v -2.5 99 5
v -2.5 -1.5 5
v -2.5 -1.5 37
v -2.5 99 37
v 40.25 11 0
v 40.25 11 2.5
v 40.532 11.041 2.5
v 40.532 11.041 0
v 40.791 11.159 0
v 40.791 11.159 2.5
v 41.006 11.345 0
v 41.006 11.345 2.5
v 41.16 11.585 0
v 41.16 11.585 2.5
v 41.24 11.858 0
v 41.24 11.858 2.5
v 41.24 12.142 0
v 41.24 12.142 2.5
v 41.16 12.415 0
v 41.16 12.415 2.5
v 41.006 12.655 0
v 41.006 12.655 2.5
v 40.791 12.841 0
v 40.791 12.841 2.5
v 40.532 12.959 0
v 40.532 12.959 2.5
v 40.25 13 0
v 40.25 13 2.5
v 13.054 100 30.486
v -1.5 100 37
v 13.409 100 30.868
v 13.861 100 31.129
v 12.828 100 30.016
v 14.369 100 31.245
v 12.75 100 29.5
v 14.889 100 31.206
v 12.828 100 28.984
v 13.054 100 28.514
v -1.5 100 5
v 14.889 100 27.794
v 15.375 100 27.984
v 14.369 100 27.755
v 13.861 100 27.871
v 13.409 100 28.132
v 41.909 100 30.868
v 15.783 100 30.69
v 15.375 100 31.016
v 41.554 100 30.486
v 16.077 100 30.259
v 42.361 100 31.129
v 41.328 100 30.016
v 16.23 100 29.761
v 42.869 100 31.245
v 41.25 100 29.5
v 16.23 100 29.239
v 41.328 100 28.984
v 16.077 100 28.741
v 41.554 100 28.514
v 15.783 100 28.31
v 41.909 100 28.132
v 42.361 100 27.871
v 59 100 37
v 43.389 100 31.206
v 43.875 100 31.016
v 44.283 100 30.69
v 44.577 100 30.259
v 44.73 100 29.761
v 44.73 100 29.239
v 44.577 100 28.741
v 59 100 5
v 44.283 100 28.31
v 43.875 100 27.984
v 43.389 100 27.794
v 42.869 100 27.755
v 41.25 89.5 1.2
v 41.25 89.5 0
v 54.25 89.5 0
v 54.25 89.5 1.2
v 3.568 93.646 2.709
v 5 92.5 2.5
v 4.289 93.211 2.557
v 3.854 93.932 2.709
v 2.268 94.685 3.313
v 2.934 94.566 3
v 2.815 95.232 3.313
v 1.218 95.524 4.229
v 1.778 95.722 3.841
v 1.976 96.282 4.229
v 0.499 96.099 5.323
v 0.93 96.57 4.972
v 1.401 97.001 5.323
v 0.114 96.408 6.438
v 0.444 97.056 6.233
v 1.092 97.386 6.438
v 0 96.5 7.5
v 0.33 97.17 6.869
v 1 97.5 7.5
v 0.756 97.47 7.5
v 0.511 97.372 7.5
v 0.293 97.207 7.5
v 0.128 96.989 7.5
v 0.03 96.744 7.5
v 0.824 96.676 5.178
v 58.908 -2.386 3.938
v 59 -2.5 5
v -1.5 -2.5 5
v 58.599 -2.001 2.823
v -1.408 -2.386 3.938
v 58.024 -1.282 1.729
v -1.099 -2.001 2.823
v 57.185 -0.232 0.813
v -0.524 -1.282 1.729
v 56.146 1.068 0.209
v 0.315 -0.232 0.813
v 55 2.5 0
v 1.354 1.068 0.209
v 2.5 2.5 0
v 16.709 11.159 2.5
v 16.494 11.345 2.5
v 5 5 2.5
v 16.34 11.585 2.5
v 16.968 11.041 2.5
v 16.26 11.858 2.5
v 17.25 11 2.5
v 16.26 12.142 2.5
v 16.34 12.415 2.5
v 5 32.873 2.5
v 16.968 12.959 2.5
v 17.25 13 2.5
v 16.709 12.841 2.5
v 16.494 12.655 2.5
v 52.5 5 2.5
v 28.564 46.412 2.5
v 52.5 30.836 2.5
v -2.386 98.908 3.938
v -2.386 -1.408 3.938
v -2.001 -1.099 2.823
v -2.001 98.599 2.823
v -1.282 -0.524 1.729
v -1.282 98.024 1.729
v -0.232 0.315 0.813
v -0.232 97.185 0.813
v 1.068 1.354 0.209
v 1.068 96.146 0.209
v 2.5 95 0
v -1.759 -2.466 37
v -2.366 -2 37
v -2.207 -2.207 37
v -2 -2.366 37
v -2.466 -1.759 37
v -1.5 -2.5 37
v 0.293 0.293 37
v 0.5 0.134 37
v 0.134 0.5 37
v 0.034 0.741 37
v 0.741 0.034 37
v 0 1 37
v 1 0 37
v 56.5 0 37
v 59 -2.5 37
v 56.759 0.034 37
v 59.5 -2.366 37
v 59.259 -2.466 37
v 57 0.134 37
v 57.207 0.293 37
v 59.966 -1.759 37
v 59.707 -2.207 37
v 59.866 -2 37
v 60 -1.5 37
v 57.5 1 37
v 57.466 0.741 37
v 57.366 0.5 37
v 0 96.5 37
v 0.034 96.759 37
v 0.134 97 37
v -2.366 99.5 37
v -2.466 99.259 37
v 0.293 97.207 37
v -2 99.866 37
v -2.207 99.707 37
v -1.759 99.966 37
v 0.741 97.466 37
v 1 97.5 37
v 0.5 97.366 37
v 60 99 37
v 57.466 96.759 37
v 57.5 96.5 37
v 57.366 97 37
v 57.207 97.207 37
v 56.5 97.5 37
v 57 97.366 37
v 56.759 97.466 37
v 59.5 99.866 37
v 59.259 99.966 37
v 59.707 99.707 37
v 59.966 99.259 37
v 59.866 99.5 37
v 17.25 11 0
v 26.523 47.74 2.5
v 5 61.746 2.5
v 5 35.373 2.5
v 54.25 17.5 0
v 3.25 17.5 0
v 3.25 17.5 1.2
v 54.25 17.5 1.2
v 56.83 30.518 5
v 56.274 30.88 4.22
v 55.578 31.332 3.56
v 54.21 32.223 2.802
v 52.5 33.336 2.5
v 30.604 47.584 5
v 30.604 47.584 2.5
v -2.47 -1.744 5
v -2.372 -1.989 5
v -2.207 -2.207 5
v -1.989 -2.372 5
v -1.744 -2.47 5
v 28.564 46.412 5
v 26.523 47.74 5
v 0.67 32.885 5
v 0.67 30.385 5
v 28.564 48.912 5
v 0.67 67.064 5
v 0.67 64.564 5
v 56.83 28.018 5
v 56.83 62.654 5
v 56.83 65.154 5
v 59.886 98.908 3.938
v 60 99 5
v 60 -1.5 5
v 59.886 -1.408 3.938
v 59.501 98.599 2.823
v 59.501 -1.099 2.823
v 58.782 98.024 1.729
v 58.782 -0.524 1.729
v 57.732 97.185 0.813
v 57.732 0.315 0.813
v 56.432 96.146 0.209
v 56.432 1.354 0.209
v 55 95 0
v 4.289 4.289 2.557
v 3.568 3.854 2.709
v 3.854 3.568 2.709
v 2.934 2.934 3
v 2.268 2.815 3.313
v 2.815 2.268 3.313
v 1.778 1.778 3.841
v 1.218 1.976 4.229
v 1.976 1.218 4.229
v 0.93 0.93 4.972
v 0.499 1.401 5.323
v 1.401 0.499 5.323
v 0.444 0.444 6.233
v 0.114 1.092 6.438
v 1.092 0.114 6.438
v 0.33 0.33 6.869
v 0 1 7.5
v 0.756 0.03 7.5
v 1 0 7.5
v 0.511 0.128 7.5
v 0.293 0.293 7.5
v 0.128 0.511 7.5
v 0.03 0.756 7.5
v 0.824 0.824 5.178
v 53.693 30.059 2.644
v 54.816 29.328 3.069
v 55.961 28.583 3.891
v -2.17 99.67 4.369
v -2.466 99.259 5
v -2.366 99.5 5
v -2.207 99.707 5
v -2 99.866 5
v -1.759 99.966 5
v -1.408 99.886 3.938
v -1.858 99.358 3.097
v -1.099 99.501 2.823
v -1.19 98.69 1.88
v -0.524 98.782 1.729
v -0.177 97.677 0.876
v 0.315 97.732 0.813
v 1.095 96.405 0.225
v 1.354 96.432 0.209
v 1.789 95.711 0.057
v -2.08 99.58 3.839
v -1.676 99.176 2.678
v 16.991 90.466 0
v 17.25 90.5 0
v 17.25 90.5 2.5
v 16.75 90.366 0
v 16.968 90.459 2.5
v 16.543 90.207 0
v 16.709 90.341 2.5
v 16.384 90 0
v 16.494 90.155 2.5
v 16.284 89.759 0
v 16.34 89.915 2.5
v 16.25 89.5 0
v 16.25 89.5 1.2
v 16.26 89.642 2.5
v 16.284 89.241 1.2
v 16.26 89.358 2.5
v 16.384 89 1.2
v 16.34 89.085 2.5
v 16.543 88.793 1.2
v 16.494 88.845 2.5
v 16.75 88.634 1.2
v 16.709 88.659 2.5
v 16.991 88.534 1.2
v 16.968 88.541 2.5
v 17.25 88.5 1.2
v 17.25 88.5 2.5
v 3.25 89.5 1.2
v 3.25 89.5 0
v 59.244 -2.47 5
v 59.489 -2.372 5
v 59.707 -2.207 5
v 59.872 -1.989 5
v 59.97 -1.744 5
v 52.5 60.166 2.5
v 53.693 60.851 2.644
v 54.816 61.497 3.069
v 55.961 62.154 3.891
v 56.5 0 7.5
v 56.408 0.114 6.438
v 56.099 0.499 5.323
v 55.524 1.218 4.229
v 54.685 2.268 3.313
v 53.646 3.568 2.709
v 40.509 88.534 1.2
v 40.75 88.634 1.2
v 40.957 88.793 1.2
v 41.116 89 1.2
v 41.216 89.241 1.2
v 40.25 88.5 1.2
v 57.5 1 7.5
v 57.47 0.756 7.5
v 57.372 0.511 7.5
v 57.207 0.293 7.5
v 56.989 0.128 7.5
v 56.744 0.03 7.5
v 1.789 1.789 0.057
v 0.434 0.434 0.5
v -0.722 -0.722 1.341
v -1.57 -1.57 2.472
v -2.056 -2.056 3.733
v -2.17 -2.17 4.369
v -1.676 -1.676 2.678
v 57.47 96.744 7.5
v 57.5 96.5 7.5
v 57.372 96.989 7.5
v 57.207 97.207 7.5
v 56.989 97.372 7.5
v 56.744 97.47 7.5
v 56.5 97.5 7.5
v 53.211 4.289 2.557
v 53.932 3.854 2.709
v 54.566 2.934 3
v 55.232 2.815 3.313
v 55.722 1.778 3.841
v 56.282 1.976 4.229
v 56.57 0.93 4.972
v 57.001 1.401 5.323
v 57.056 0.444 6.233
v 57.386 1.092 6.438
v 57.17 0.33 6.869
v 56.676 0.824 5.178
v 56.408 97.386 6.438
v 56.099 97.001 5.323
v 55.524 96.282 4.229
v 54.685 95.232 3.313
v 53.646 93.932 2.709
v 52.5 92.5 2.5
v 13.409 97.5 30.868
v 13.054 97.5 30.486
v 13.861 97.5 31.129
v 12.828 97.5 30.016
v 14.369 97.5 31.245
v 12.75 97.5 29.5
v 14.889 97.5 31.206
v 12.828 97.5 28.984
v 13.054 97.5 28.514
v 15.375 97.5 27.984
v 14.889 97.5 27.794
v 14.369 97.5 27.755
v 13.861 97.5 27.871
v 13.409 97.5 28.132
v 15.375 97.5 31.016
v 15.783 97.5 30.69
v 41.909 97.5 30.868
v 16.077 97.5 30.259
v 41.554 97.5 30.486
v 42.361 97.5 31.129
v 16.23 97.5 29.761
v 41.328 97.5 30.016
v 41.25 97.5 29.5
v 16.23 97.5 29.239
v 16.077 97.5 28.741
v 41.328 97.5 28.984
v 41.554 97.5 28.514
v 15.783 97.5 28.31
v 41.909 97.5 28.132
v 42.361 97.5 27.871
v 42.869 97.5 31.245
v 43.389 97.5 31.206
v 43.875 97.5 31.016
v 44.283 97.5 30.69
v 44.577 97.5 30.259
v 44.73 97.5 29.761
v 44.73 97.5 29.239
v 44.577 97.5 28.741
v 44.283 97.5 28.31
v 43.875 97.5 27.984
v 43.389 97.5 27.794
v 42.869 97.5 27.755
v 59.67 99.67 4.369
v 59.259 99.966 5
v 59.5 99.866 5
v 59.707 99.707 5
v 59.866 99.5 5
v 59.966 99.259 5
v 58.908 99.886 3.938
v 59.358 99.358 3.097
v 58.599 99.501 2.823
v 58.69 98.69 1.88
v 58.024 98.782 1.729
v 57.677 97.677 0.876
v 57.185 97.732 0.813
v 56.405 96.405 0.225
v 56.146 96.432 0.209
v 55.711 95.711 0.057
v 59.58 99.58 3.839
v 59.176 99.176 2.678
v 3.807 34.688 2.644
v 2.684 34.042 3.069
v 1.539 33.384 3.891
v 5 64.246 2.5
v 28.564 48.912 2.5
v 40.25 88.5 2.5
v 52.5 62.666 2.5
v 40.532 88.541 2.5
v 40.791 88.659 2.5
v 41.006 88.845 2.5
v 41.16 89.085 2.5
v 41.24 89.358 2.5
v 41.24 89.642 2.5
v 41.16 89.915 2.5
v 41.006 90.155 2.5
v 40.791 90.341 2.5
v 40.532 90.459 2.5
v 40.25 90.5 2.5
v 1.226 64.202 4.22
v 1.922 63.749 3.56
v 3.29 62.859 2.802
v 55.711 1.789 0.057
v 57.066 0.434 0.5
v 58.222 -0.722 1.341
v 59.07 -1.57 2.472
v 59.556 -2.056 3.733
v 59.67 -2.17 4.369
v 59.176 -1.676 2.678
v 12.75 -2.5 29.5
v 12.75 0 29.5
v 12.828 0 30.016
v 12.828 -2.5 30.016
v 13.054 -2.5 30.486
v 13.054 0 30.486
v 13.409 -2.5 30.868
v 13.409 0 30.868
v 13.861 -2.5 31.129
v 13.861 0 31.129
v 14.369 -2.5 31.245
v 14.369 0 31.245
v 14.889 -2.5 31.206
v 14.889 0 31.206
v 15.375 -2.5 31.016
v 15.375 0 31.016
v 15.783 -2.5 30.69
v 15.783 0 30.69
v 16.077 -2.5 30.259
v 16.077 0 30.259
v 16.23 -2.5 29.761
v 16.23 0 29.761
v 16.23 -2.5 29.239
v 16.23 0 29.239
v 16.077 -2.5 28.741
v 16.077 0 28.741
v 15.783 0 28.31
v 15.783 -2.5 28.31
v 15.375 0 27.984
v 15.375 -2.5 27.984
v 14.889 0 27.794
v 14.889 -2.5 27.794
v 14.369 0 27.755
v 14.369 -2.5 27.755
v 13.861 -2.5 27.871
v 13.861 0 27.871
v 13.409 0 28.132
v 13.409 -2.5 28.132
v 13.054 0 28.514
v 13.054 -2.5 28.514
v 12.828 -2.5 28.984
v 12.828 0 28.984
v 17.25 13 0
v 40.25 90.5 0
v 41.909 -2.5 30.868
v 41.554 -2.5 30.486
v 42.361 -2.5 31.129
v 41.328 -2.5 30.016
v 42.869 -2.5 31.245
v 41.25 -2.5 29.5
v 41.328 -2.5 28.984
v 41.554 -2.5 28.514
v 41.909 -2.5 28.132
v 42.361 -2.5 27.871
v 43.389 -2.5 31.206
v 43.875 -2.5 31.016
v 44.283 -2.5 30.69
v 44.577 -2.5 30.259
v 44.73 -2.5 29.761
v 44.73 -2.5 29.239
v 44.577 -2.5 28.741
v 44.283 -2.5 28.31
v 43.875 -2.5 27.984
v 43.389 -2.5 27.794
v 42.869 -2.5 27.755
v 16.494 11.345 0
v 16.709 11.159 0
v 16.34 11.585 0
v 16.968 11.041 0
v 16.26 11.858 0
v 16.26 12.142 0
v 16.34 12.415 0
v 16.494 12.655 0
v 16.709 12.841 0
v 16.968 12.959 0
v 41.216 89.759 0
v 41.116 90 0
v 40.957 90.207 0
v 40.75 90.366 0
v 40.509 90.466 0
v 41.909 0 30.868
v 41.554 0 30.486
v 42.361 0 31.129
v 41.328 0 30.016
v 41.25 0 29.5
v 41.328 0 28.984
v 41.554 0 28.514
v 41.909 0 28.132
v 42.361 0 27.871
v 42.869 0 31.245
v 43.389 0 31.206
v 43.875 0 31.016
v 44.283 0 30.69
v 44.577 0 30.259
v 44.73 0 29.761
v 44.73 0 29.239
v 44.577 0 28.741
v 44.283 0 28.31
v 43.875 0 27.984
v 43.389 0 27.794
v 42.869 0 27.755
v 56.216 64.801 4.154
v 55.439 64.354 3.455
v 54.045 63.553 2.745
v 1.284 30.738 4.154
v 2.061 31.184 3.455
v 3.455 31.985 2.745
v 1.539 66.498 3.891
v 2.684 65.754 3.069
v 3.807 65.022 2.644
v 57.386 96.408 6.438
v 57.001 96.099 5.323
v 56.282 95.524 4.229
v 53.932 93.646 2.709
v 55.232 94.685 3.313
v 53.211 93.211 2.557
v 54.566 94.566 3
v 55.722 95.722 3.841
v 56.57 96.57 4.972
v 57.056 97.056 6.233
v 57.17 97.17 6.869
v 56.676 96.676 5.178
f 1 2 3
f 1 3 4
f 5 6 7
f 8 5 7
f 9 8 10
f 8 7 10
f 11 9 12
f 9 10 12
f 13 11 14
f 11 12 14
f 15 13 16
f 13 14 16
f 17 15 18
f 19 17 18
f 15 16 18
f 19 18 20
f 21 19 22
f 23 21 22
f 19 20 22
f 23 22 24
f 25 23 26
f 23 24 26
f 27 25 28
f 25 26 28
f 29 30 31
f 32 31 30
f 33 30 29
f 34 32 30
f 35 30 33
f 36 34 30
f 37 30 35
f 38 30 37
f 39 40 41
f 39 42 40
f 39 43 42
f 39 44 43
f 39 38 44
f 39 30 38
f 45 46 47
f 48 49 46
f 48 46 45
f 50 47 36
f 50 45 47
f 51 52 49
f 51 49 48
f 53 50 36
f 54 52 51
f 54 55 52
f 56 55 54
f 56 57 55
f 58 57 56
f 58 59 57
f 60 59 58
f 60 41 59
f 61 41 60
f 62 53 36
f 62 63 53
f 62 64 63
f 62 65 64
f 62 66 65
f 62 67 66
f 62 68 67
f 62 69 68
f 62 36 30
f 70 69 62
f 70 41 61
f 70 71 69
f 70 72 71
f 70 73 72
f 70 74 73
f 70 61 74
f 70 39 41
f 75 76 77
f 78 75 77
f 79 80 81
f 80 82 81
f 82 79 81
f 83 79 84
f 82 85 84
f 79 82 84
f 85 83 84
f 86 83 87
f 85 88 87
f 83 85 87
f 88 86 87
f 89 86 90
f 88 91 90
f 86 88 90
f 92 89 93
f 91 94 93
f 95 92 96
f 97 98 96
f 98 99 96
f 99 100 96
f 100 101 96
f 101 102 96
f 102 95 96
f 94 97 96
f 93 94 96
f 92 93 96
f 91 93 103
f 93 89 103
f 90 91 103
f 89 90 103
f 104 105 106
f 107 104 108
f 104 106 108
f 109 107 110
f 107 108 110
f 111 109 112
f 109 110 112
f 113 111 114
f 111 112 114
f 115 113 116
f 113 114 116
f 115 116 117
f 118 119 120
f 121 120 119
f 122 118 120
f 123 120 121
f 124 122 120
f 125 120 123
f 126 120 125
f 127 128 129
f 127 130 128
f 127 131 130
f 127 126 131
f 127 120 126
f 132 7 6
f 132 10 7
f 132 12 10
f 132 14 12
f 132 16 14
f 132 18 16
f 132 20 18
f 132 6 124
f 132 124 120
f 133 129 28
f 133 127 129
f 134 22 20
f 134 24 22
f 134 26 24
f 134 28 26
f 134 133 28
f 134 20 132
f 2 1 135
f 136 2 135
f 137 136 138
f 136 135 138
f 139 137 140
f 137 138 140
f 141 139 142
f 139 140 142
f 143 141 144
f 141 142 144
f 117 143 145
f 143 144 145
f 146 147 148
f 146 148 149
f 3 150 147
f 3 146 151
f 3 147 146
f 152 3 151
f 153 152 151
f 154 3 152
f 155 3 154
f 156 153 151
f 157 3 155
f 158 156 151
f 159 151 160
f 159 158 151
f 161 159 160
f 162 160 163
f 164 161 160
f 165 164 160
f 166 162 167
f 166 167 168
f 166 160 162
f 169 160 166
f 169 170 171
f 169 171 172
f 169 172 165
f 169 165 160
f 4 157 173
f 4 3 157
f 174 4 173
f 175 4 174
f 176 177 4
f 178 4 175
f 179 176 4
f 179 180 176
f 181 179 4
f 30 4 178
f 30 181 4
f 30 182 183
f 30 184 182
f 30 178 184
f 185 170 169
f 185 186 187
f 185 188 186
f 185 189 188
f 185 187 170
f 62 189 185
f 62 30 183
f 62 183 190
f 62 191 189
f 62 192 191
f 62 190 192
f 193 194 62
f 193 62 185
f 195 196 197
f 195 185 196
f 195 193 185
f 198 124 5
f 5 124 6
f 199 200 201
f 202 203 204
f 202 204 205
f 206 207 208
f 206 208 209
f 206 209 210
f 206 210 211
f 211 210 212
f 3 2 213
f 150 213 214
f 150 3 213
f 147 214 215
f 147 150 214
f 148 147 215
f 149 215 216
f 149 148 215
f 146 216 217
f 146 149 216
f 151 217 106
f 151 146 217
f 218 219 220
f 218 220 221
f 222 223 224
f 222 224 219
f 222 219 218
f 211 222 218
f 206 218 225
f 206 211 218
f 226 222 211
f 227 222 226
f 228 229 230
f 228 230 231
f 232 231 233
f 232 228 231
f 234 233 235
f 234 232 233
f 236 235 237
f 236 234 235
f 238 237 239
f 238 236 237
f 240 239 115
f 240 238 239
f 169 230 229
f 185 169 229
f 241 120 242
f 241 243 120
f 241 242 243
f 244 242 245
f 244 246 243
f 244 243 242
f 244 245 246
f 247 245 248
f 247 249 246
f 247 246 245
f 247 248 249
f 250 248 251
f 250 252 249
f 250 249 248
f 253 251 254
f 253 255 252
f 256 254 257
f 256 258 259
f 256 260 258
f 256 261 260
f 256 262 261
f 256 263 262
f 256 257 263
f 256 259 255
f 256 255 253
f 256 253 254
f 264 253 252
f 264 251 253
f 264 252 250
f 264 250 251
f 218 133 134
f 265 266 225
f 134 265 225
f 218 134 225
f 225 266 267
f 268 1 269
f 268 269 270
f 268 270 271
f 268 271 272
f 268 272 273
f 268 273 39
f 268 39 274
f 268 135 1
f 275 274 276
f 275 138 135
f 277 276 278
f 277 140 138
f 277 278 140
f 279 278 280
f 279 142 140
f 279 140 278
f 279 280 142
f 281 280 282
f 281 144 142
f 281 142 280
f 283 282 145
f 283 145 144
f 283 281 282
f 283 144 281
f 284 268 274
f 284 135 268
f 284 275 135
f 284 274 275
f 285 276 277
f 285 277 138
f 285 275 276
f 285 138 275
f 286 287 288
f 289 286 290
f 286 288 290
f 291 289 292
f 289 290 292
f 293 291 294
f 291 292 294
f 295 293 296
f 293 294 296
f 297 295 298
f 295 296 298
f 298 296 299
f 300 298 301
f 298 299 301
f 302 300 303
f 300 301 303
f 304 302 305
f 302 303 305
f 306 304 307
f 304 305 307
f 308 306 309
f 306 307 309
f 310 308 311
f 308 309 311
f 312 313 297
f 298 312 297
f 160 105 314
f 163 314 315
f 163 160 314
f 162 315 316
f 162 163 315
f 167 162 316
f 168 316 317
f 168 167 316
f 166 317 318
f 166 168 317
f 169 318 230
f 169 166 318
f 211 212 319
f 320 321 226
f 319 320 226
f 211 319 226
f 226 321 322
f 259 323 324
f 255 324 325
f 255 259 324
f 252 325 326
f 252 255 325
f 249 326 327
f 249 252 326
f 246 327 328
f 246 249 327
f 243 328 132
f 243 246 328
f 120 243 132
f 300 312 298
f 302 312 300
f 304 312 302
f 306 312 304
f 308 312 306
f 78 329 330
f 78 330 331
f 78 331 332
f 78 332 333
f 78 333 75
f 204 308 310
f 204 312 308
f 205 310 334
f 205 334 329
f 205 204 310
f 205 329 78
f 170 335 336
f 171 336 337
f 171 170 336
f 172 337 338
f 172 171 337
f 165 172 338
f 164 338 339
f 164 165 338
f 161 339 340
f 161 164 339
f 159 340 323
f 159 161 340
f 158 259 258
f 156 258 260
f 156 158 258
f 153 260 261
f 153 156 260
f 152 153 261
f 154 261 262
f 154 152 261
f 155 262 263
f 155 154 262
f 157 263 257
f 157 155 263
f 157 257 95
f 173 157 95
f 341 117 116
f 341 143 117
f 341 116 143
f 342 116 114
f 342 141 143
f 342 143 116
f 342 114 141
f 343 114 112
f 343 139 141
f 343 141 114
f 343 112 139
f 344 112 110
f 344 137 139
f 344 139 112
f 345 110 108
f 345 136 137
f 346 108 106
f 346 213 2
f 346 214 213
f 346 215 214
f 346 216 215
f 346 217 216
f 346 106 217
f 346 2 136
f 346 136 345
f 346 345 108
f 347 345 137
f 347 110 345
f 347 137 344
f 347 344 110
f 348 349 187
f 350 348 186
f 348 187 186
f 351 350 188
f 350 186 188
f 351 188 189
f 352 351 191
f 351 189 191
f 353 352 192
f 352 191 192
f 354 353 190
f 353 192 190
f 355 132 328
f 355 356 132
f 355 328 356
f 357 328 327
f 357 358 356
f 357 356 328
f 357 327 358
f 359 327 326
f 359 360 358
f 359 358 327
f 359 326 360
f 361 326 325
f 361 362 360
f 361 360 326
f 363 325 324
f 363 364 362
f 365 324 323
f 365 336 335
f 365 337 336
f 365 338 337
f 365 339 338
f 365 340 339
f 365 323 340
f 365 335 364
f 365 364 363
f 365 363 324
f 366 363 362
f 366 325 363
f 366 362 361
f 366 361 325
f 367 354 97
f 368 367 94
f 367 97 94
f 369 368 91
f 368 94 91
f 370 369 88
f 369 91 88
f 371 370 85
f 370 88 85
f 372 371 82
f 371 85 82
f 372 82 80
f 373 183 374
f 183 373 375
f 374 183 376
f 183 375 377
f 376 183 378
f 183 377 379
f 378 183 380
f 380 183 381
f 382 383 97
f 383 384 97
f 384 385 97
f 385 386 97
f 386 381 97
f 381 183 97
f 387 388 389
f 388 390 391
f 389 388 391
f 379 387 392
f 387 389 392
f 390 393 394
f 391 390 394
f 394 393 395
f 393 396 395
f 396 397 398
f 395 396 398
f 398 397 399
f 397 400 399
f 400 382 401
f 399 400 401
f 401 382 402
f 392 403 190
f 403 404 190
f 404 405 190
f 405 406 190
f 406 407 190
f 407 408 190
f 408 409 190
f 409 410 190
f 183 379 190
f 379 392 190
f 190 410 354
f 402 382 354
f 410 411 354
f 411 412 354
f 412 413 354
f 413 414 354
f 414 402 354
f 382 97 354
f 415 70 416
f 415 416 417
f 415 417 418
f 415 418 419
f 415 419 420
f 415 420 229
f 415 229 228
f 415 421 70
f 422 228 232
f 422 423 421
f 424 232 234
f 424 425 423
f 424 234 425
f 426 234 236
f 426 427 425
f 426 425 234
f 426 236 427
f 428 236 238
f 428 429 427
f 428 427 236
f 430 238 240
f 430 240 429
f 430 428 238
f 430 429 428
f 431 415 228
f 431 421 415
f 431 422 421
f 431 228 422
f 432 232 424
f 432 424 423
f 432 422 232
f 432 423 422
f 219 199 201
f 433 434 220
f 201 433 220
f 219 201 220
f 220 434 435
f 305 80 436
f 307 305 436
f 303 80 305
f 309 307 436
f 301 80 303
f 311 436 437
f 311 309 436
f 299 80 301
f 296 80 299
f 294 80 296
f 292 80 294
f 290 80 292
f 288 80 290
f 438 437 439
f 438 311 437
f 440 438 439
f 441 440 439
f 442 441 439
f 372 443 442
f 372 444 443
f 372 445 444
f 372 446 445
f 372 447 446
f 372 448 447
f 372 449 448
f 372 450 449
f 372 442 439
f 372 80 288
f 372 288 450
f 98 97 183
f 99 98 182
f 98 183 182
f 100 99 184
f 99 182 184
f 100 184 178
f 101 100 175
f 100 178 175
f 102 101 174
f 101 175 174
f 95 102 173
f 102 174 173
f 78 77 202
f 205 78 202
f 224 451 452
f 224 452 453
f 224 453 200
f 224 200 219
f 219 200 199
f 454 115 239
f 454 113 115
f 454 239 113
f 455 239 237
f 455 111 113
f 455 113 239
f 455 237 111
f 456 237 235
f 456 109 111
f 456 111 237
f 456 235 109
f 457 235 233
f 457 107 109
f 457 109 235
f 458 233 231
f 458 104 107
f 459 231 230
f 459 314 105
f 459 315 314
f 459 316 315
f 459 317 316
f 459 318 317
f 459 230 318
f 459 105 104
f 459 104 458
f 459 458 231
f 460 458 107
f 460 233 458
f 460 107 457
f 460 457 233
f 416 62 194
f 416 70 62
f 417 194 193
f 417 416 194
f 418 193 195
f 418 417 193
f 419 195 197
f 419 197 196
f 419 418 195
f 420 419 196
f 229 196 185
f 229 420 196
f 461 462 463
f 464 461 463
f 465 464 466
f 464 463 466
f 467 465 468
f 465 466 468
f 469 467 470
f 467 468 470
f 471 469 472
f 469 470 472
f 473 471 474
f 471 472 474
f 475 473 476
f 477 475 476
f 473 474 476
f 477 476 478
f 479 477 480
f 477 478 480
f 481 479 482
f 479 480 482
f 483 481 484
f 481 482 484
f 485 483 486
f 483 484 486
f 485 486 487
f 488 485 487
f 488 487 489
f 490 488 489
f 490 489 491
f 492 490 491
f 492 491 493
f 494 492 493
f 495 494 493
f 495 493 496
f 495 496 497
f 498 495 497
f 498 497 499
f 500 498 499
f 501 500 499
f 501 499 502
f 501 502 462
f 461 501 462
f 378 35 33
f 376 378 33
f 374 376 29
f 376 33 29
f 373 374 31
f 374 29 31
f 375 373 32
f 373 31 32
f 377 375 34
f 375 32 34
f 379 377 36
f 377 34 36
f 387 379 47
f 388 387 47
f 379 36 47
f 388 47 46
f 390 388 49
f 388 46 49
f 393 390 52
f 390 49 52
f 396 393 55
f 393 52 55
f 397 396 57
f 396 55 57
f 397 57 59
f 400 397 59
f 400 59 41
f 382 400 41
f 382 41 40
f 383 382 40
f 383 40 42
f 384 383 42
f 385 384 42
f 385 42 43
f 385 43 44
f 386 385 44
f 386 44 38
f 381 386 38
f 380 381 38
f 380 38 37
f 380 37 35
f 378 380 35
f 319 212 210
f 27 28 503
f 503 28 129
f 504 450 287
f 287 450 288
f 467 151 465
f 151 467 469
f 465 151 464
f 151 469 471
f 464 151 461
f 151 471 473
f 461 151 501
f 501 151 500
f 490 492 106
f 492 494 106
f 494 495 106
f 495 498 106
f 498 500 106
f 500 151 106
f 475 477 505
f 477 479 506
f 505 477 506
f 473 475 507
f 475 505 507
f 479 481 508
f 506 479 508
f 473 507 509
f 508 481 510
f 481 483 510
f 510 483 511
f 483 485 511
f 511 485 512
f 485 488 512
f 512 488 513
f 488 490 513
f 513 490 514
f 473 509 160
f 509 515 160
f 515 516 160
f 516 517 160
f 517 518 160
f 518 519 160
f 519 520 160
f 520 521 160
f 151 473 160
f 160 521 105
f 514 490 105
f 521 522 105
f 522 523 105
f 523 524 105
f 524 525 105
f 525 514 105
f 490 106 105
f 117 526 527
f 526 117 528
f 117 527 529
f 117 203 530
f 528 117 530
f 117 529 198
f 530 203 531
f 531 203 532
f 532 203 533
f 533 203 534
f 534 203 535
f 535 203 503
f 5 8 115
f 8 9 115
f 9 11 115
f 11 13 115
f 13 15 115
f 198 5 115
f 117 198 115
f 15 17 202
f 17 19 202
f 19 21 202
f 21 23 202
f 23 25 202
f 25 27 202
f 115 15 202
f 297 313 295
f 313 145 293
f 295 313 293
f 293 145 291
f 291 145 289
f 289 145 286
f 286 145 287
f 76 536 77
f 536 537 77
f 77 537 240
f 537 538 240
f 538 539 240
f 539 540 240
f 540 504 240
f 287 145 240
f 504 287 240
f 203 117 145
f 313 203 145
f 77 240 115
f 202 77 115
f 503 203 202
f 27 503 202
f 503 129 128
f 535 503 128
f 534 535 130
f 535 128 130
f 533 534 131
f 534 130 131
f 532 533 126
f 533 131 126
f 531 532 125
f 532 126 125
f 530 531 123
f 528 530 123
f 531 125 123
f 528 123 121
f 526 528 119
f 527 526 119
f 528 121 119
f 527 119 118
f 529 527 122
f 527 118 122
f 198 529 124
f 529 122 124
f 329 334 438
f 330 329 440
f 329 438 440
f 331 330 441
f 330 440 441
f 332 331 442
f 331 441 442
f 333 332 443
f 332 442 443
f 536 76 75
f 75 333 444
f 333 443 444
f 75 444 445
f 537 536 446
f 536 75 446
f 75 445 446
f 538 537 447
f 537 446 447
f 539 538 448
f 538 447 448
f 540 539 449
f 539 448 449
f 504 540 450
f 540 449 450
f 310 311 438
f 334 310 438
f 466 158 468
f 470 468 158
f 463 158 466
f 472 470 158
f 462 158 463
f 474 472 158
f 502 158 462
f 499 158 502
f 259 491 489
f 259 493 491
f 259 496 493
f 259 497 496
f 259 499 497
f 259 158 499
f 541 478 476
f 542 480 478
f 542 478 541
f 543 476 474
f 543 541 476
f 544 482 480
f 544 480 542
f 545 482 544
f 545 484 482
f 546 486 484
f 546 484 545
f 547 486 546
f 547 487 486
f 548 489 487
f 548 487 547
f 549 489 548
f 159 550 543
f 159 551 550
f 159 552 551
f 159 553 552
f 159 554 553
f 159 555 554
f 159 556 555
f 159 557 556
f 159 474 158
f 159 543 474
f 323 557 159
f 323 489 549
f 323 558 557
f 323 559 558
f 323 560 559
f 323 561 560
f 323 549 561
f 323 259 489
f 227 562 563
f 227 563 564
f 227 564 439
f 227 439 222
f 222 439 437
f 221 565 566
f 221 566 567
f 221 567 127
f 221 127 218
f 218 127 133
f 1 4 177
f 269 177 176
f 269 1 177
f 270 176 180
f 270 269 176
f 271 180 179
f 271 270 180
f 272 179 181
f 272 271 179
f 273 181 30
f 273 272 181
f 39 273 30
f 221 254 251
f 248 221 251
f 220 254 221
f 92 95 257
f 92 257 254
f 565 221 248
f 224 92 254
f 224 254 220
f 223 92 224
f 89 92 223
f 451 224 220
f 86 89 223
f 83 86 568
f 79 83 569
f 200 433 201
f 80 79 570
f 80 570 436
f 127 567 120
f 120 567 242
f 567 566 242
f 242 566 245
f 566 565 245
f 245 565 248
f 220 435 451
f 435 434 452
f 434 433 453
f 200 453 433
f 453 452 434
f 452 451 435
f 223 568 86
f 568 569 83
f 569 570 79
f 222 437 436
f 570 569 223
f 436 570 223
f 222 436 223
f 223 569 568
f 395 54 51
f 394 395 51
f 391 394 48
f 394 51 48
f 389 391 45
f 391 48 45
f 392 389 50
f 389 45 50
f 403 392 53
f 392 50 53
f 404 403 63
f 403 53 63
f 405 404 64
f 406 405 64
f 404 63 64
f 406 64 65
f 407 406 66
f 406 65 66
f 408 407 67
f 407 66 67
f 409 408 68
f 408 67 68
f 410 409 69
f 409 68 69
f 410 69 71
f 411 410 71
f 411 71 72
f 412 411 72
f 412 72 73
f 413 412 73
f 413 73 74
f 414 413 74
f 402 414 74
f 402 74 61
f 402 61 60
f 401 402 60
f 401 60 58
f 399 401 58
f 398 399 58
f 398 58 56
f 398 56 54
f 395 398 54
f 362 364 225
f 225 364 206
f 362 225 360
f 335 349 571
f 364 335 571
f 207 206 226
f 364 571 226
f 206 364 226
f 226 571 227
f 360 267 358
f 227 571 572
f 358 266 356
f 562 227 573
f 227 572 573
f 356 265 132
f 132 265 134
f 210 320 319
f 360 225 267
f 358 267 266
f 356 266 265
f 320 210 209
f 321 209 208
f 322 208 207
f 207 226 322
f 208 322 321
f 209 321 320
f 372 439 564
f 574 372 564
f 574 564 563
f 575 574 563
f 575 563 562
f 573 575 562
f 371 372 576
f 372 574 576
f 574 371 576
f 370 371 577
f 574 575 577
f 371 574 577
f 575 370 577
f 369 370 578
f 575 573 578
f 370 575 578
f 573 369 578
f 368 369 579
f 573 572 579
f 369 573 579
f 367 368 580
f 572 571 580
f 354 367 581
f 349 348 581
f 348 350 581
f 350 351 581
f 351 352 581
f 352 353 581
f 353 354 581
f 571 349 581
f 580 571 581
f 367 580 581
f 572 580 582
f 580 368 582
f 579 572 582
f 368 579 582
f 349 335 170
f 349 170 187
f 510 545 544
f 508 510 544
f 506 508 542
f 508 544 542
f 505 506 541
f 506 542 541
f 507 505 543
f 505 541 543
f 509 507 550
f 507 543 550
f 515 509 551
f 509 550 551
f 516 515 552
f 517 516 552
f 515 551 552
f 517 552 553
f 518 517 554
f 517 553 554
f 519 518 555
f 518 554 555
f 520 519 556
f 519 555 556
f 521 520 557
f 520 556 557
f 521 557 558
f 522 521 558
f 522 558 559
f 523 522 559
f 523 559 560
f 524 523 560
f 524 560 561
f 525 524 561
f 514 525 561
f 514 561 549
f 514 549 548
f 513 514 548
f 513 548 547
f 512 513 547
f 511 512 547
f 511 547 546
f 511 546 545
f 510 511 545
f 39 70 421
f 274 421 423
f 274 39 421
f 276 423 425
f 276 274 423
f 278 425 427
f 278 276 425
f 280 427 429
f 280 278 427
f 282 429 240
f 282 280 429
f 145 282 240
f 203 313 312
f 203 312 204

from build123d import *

# Parameters (mm, degrees)
F1_W          = 62.5
F1_H          = 102.5
F1_W_2        = 57.5
F1_H_2        = 97.5
F2_DEPTH      = 37
F3_W          = 62.5
F3_H          = 102.5
F4_DEPTH      = 2.5
F6_DEPTH      = 2.501
F7_W          = 51
F7_H          = 72
F8_DEPTH      = 1.2
F10_DEPTH     = 2.5
F11_R         = 1.75
F12_DEPTH     = 102.501
F13_T1_DEPTH  = 42.5
F13_T3_DEPTH  = 57.5
F13_T5_DEPTH  = 42.5
F13_T7_DEPTH  = 57.5
F13_T9_DEPTH  = 44.4614347816
F13_T11_DEPTH = 57.9568101466
F13_T13_DEPTH = 40.0817550719
F13_T15_DEPTH = 127.5
F13_T17_DEPTH = 87.5
F14_R         = 1


# Not quite as in the source:
# - a fillet or chamfer that OpenCascade refuses, or shapes differently, is made with other operations: its cross-section is extruded or revolved along the edge and cut away or added


with BuildPart() as f2:
    # F1 (on Top) → F2 (new body)
    with BuildSketch(Plane.XY):
        with Locations((28.75, 48.75)):
            Rectangle(F1_W, F1_H)
        with Locations((28.75, 48.75)):
            Rectangle(F1_W_2, F1_H_2, mode=Mode.SUBTRACT)
    extrude(amount=F2_DEPTH)

    # F3 (on Top) → F4 (join)
    with BuildSketch(Plane.XY):
        with Locations((28.75, 48.75)):
            Rectangle(F3_W, F3_H)
    extrude(amount=F4_DEPTH)

    # F5 (on face) → F6 (cut, through all)
    with BuildSketch(Plane.XY.offset(2.5)):
        with BuildLine():
            ThreePointArc((17.25, 90.5), (16.25, 89.5), (17.25, 88.5))
            Line((17.25, 88.5), (40.25, 88.5))
            ThreePointArc((40.25, 88.5), (41.25, 89.5), (40.25, 90.5))
            Line((40.25, 90.5), (17.25, 90.5))
        make_face()
        with BuildLine():
            ThreePointArc((17.25, 13), (16.25, 12), (17.25, 11))
            Line((17.25, 11), (40.25, 11))
            ThreePointArc((40.25, 11), (41.25, 12), (40.25, 13))
            Line((40.25, 13), (17.25, 13))
        make_face()
    extrude(amount=-F6_DEPTH, mode=Mode.SUBTRACT)

    # F7 (on face) → F8 (cut)
    with BuildSketch(Plane(origin=(0, 0, 0), x_dir=(1, 0, 0), z_dir=(0, 0, -1))):
        with Locations((28.75, -53.5)):
            Rectangle(F7_W, F7_H)
    extrude(amount=-F8_DEPTH, mode=Mode.SUBTRACT)

    # F9 (on face) → F10 (join)
    with BuildSketch(Plane.XY.offset(2.5)):
        Polygon((0, 32.5), (0, 30), (28.5635979803, 46.412179039), (26.5233409817, 47.7398805363), align=None)
        Polygon((26.5233409817, 47.7398805363), (28.5635979803, 46.412179039), (30.6038549789, 47.5844775418), (28.5635979803, 48.912179039), align=None)
        Polygon((30.6038549789, 47.5844775418), (28.5635979803, 46.412179039), (57.5, 27.5817550719), (57.5, 30.0817550719), align=None)
        Polygon((28.5635979803, 48.912179039), (30.6038549789, 47.5844775418), (57.5, 63.0385652184), (57.5, 65.5385652184), align=None)
        Polygon((0, 65), (26.5233409817, 47.7398805363), (28.5635979803, 48.912179039), (0, 67.5), align=None)
    extrude(amount=F10_DEPTH)

    # F11 (on face) → F12 (cut, through all)
    with BuildSketch(Plane(origin=(0, 100, 0), x_dir=(-1, 0, 0), z_dir=(0, 1, 0))):
        with Locations((-14.5, 29.5)):
            Circle(F11_R)
        with Locations((-43, 29.5)):
            Circle(F11_R)
    extrude(amount=-F12_DEPTH, mode=Mode.SUBTRACT)

    # F13: fillet of radius 5 on 12 edges, made by hand

    # F13_s2 → F13_t1 (join)
    with BuildSketch(Plane.XZ.offset(-42.5)):
        with BuildLine():
            ThreePointArc((0, 7.5), (1.4644660941, 3.9644660941), (5, 2.5))
            Line((5, 2.5), (0, 2.5))
            Line((0, 2.5), (0, 7.5))
        make_face()
    extrude(amount=F13_T1_DEPTH)

    # F13_s4 → F13_t3 (join)
    with BuildSketch(Plane.XZ.offset(-77.5)):
        with BuildLine():
            ThreePointArc((0, 7.5), (1.4644660941, 3.9644660941), (5, 2.5))
            Line((5, 2.5), (0, 2.5))
            Line((0, 2.5), (0, 7.5))
        make_face()
    extrude(amount=F13_T3_DEPTH)

    # F13_s6 → F13_t5 (join)
    with BuildSketch(Plane.XZ.offset(-97.5)):
        with BuildLine():
            ThreePointArc((0, 7.5), (1.4644660941, 3.9644660941), (5, 2.5))
            Line((5, 2.5), (0, 2.5))
            Line((0, 2.5), (0, 7.5))
        make_face()
    extrude(amount=F13_T5_DEPTH)

    # F13_s8 → F13_t7 (join)
    with BuildSketch(Plane.YZ):
        with BuildLine():
            ThreePointArc((0, 7.5), (1.4644660941, 3.9644660941), (5, 2.5))
            Line((5, 2.5), (0, 2.5))
            Line((0, 2.5), (0, 7.5))
        make_face()
        with BuildLine():
            ThreePointArc((97.5, 7.5), (96.0355339059, 3.9644660941), (92.5, 2.5))
            Line((92.5, 2.5), (97.5, 2.5))
            Line((97.5, 2.5), (97.5, 7.5))
        make_face()
    extrude(amount=F13_T7_DEPTH)

    # F13_s10 → F13_t9 (join)
    with BuildSketch(Plane.XZ.offset(-97.5)):
        with BuildLine():
            ThreePointArc((57.5, 7.5), (56.0355339059, 3.9644660941), (52.5, 2.5))
            Line((52.5, 2.5), (57.5, 2.5))
            Line((57.5, 2.5), (57.5, 7.5))
        make_face()
    extrude(amount=F13_T9_DEPTH)

    # F13_s12 → F13_t11 (join)
    with BuildSketch(Plane.XZ.offset(-75.5385652184)):
        with BuildLine():
            ThreePointArc((57.5, 7.5), (56.0355339059, 3.9644660941), (52.5, 2.5))
            Line((52.5, 2.5), (57.5, 2.5))
            Line((57.5, 2.5), (57.5, 7.5))
        make_face()
    extrude(amount=F13_T11_DEPTH)

    # F13_s14 → F13_t13 (join)
    with BuildSketch(Plane.XZ.offset(-40.0817550719)):
        with BuildLine():
            ThreePointArc((57.5, 7.5), (56.0355339059, 3.9644660941), (52.5, 2.5))
            Line((52.5, 2.5), (57.5, 2.5))
            Line((57.5, 2.5), (57.5, 7.5))
        make_face()
    extrude(amount=F13_T13_DEPTH)

    # F13_s16 → F13_t15 (cut)
    with BuildSketch(Plane.XZ.offset(-112.5)):
        with BuildLine():
            ThreePointArc((-2.5, 5), (-1.0355339059, 1.4644660941), (2.5, 0))
            Line((2.5, 0), (-2.5, 0))
            Line((-2.5, 0), (-2.5, 5))
        make_face()
        with BuildLine():
            ThreePointArc((60, 5), (58.5355339059, 1.4644660941), (55, 0))
            Line((55, 0), (60, 0))
            Line((60, 0), (60, 5))
        make_face()
    extrude(amount=F13_T15_DEPTH, mode=Mode.SUBTRACT)

    # F13_s18 → F13_t17 (cut)
    with BuildSketch(Plane.YZ.offset(-15)):
        with BuildLine():
            ThreePointArc((100, 5), (98.5355339059, 1.4644660941), (95, 0))
            Line((95, 0), (100, 0))
            Line((100, 0), (100, 5))
        make_face()
        with BuildLine():
            ThreePointArc((-2.5, 5), (-1.0355339059, 1.4644660941), (2.5, 0))
            Line((2.5, 0), (-2.5, 0))
            Line((-2.5, 0), (-2.5, 5))
        make_face()
    extrude(amount=F13_T17_DEPTH, mode=Mode.SUBTRACT)

    # F14
    f14_edges = [f2.edges().sort_by_distance(p)[0] for p in [
        (60, 100, 21),
        (-2.5, 100, 21),
        (-2.5, -2.5, 21),
        (60, -2.5, 21),
        (0, 0, 22.25),
        (57.5, 0, 22.25),
        (57.5, 97.5, 22.25),
        (0, 97.5, 22.25),
        (-1.035534, 98.535534, 1.464466),
        (58.535534, 98.535534, 1.464466),
        (-1.035534, -1.035534, 1.464466),
        (58.535534, -1.035534, 1.464466),
        (56.035534, 1.464466, 3.964466),
        (1.464466, 1.464466, 3.964466),
        (1.464466, 96.035534, 3.964466),
        (56.035534, 96.035534, 3.964466),
    ]]
    fillet(f14_edges, radius=F14_R)


solid = f2.part
